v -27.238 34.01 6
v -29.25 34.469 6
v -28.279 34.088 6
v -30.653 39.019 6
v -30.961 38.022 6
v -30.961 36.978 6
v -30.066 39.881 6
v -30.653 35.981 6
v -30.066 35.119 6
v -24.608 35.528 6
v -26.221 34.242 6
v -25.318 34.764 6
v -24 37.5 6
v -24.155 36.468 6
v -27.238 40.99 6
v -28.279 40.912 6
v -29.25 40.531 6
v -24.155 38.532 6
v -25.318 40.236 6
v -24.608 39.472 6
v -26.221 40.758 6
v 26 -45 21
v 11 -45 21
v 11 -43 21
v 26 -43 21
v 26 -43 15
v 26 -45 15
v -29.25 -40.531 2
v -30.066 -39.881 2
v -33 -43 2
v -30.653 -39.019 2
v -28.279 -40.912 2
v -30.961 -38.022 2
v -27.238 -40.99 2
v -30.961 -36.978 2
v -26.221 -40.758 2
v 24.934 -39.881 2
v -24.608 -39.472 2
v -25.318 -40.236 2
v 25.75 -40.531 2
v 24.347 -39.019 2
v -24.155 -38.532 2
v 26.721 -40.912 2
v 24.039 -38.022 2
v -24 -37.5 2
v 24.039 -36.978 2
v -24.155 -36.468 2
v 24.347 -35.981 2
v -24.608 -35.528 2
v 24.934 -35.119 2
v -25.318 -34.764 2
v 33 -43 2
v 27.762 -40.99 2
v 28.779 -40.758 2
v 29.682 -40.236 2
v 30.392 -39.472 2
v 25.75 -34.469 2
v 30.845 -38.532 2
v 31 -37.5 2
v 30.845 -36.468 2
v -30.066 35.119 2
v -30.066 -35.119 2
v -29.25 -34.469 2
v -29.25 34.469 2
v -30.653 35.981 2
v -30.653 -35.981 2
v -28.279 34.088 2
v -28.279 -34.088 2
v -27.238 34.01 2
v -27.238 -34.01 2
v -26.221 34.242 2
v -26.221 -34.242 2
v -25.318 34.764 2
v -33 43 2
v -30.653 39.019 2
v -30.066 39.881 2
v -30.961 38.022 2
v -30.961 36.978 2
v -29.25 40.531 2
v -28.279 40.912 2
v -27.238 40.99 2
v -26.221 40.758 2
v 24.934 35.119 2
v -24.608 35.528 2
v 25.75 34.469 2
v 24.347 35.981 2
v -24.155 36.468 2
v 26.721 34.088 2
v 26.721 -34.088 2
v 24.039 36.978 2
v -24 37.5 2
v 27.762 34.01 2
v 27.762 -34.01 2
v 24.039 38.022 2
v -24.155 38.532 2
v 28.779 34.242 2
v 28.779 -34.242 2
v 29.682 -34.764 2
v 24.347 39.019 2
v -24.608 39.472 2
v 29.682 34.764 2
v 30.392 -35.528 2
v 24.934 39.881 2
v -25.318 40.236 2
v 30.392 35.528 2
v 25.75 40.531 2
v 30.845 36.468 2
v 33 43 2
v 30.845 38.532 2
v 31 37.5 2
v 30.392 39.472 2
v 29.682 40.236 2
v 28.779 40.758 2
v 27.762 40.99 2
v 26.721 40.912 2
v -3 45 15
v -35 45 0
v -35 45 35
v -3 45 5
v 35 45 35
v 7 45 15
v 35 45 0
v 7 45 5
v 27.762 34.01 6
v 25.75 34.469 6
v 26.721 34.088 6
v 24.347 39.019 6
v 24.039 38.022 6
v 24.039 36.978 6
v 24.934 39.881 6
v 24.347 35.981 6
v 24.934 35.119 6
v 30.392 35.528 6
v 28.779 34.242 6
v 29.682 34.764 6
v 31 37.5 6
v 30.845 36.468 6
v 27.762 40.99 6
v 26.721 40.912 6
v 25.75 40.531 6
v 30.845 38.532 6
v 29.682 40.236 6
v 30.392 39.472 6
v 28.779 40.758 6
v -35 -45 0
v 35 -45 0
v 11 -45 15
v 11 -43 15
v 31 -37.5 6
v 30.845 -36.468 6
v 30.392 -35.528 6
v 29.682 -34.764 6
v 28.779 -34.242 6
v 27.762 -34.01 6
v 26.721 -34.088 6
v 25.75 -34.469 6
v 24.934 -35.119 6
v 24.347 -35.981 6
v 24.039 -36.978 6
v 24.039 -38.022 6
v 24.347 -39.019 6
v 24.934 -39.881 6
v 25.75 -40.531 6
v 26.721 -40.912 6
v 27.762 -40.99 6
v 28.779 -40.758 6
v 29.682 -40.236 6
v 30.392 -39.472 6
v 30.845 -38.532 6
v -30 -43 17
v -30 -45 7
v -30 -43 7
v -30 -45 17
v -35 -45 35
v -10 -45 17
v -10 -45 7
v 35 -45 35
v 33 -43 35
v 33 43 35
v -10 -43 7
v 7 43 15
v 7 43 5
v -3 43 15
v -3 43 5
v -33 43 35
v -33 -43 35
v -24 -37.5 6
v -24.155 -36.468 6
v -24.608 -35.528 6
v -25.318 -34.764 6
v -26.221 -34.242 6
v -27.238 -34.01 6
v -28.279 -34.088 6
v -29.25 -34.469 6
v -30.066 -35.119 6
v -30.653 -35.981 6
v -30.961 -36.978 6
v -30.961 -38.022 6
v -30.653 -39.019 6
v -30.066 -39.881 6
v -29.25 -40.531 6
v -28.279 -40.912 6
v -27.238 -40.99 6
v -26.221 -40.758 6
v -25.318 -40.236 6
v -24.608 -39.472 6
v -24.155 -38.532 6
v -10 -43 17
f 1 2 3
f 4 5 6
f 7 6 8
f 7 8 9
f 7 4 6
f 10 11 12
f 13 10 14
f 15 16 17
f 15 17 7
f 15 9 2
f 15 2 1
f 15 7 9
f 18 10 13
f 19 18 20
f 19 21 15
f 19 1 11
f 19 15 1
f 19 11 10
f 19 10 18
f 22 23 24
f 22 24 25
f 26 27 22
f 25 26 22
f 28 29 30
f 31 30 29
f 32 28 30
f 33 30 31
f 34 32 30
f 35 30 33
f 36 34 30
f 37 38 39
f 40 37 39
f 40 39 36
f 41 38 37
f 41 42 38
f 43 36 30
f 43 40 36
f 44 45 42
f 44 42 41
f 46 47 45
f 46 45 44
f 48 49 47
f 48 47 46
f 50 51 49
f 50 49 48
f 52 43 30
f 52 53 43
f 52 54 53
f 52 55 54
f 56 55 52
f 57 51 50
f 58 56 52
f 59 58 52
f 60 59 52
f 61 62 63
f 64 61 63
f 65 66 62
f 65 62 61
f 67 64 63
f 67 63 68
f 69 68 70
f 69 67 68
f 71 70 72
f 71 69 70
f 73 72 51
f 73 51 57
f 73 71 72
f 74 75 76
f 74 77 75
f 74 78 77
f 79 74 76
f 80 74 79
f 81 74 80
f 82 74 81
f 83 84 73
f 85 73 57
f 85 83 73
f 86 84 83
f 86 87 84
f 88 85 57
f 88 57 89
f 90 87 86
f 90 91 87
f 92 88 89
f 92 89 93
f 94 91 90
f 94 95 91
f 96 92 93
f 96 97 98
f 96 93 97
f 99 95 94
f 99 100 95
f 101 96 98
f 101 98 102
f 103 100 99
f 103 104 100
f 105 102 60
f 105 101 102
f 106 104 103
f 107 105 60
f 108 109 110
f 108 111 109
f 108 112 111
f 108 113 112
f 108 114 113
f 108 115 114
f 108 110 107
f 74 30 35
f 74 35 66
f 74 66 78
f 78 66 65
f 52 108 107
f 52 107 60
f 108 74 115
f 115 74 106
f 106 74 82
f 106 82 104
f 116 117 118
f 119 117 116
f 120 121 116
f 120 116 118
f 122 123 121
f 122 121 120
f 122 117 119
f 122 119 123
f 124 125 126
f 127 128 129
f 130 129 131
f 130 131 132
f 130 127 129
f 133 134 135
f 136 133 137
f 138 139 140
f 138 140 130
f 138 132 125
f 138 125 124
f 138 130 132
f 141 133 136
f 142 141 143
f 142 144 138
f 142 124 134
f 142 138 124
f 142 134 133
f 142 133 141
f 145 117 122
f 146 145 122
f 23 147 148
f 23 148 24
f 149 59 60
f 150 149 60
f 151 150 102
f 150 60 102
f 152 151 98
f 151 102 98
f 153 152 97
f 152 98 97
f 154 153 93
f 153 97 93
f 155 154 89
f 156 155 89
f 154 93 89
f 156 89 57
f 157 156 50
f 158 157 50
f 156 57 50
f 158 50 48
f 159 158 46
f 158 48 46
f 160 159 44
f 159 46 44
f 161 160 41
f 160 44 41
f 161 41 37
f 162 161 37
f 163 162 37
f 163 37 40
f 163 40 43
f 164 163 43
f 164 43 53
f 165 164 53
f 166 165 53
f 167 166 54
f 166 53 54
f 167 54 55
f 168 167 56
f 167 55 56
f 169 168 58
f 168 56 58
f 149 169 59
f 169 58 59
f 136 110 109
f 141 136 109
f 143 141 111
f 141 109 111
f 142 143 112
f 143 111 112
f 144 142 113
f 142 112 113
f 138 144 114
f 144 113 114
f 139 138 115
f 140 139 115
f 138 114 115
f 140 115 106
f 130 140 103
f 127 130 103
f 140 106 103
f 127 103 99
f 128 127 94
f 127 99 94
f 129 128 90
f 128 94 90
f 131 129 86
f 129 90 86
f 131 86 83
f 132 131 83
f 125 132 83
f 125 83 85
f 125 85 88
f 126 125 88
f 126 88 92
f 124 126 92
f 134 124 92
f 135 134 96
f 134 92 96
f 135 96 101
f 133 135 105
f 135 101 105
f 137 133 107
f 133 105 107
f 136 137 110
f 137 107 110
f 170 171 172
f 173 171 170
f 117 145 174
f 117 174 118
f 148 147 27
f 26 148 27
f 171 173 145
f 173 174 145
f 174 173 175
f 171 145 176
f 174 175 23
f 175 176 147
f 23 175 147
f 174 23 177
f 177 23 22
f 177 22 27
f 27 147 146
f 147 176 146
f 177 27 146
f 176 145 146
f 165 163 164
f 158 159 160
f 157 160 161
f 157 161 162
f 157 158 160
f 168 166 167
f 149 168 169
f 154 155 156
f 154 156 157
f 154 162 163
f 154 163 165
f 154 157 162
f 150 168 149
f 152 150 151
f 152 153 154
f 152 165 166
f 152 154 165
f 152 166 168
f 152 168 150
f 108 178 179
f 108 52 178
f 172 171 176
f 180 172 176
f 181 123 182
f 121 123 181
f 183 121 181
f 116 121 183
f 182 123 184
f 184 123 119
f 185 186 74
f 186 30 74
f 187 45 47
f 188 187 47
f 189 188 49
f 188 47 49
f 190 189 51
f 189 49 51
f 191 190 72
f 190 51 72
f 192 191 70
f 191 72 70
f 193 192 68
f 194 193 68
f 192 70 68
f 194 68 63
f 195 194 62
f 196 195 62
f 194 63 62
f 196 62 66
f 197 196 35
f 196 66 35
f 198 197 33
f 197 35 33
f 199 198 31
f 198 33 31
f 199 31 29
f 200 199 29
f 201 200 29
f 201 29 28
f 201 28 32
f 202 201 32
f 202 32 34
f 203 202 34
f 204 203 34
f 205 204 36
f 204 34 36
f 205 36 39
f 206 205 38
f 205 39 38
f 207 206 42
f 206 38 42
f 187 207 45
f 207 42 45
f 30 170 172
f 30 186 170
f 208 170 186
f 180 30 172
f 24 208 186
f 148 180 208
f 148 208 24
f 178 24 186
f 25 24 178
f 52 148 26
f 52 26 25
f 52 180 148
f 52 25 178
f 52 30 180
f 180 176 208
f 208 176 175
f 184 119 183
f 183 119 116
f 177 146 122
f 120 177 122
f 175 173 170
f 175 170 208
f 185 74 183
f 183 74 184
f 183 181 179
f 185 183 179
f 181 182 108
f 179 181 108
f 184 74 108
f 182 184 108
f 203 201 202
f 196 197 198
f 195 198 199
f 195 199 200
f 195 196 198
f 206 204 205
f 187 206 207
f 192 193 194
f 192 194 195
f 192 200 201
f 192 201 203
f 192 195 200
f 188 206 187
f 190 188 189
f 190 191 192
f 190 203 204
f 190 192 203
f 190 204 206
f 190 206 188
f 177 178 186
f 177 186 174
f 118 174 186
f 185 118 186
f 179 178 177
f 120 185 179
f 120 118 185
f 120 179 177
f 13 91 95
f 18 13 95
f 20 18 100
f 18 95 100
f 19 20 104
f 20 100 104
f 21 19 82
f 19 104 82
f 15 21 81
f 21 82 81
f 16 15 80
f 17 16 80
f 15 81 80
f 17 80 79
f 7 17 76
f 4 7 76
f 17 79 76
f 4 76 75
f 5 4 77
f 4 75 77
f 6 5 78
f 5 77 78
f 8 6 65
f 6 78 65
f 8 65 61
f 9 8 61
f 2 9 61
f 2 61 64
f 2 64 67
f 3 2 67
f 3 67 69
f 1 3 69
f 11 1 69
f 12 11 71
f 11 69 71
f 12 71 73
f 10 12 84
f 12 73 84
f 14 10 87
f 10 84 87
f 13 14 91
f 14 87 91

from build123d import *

# Parameters (mm, degrees)
F0_W     = 70
F0_H     = 90
F1_DEPTH = 35
F2_T     = -2
F3_R     = 3.5
F4_DEPTH = 4
F5_W     = 20
F5_H     = 10
F5_W_2   = 15
F5_H_2   = 6
F6_DEPTH = 2
F7_W     = 10
F7_H     = 10
F8_DEPTH = 2


with BuildPart() as f1:
    # F0 (on Top) → F1 (new body)
    with BuildSketch(Plane.XY):
        Rectangle(F0_W, F0_H)
    extrude(amount=F1_DEPTH)

    # F2
    f2_openings = [f1.faces().sort_by_distance(p)[0] for p in [
        (0, 0, 35),
    ]]
    offset(amount=F2_T, openings=f2_openings)

    # F3 (on face) → F4 (join)
    with BuildSketch(Plane.XY.offset(2)):
        with Locations((-27.5, 37.5)):
            Circle(F3_R)
        with Locations((27.5, -37.5)):
            Circle(F3_R)
        with Locations((27.5, 37.5)):
            Circle(F3_R)
        with Locations((-27.5, -37.5)):
            Circle(F3_R)
    extrude(amount=F4_DEPTH)

    # F5 (on face) → F6 (cut, through all)
    with BuildSketch(Plane.XZ.offset(45)):
        with Locations((-20, 12)):
            Rectangle(F5_W, F5_H)
        with Locations((18.5, 18)):
            Rectangle(F5_W_2, F5_H_2)
    extrude(amount=-F6_DEPTH, mode=Mode.SUBTRACT)

    # F7 (on face) → F8 (cut, through all)
    with BuildSketch(Plane(origin=(0, 45, 0), x_dir=(-1, 0, 0), z_dir=(0, 1, 0))):
        with Locations((-2, 10)):
            Rectangle(F7_W, F7_H)
    extrude(amount=-F8_DEPTH, mode=Mode.SUBTRACT)


solid = f1.part
